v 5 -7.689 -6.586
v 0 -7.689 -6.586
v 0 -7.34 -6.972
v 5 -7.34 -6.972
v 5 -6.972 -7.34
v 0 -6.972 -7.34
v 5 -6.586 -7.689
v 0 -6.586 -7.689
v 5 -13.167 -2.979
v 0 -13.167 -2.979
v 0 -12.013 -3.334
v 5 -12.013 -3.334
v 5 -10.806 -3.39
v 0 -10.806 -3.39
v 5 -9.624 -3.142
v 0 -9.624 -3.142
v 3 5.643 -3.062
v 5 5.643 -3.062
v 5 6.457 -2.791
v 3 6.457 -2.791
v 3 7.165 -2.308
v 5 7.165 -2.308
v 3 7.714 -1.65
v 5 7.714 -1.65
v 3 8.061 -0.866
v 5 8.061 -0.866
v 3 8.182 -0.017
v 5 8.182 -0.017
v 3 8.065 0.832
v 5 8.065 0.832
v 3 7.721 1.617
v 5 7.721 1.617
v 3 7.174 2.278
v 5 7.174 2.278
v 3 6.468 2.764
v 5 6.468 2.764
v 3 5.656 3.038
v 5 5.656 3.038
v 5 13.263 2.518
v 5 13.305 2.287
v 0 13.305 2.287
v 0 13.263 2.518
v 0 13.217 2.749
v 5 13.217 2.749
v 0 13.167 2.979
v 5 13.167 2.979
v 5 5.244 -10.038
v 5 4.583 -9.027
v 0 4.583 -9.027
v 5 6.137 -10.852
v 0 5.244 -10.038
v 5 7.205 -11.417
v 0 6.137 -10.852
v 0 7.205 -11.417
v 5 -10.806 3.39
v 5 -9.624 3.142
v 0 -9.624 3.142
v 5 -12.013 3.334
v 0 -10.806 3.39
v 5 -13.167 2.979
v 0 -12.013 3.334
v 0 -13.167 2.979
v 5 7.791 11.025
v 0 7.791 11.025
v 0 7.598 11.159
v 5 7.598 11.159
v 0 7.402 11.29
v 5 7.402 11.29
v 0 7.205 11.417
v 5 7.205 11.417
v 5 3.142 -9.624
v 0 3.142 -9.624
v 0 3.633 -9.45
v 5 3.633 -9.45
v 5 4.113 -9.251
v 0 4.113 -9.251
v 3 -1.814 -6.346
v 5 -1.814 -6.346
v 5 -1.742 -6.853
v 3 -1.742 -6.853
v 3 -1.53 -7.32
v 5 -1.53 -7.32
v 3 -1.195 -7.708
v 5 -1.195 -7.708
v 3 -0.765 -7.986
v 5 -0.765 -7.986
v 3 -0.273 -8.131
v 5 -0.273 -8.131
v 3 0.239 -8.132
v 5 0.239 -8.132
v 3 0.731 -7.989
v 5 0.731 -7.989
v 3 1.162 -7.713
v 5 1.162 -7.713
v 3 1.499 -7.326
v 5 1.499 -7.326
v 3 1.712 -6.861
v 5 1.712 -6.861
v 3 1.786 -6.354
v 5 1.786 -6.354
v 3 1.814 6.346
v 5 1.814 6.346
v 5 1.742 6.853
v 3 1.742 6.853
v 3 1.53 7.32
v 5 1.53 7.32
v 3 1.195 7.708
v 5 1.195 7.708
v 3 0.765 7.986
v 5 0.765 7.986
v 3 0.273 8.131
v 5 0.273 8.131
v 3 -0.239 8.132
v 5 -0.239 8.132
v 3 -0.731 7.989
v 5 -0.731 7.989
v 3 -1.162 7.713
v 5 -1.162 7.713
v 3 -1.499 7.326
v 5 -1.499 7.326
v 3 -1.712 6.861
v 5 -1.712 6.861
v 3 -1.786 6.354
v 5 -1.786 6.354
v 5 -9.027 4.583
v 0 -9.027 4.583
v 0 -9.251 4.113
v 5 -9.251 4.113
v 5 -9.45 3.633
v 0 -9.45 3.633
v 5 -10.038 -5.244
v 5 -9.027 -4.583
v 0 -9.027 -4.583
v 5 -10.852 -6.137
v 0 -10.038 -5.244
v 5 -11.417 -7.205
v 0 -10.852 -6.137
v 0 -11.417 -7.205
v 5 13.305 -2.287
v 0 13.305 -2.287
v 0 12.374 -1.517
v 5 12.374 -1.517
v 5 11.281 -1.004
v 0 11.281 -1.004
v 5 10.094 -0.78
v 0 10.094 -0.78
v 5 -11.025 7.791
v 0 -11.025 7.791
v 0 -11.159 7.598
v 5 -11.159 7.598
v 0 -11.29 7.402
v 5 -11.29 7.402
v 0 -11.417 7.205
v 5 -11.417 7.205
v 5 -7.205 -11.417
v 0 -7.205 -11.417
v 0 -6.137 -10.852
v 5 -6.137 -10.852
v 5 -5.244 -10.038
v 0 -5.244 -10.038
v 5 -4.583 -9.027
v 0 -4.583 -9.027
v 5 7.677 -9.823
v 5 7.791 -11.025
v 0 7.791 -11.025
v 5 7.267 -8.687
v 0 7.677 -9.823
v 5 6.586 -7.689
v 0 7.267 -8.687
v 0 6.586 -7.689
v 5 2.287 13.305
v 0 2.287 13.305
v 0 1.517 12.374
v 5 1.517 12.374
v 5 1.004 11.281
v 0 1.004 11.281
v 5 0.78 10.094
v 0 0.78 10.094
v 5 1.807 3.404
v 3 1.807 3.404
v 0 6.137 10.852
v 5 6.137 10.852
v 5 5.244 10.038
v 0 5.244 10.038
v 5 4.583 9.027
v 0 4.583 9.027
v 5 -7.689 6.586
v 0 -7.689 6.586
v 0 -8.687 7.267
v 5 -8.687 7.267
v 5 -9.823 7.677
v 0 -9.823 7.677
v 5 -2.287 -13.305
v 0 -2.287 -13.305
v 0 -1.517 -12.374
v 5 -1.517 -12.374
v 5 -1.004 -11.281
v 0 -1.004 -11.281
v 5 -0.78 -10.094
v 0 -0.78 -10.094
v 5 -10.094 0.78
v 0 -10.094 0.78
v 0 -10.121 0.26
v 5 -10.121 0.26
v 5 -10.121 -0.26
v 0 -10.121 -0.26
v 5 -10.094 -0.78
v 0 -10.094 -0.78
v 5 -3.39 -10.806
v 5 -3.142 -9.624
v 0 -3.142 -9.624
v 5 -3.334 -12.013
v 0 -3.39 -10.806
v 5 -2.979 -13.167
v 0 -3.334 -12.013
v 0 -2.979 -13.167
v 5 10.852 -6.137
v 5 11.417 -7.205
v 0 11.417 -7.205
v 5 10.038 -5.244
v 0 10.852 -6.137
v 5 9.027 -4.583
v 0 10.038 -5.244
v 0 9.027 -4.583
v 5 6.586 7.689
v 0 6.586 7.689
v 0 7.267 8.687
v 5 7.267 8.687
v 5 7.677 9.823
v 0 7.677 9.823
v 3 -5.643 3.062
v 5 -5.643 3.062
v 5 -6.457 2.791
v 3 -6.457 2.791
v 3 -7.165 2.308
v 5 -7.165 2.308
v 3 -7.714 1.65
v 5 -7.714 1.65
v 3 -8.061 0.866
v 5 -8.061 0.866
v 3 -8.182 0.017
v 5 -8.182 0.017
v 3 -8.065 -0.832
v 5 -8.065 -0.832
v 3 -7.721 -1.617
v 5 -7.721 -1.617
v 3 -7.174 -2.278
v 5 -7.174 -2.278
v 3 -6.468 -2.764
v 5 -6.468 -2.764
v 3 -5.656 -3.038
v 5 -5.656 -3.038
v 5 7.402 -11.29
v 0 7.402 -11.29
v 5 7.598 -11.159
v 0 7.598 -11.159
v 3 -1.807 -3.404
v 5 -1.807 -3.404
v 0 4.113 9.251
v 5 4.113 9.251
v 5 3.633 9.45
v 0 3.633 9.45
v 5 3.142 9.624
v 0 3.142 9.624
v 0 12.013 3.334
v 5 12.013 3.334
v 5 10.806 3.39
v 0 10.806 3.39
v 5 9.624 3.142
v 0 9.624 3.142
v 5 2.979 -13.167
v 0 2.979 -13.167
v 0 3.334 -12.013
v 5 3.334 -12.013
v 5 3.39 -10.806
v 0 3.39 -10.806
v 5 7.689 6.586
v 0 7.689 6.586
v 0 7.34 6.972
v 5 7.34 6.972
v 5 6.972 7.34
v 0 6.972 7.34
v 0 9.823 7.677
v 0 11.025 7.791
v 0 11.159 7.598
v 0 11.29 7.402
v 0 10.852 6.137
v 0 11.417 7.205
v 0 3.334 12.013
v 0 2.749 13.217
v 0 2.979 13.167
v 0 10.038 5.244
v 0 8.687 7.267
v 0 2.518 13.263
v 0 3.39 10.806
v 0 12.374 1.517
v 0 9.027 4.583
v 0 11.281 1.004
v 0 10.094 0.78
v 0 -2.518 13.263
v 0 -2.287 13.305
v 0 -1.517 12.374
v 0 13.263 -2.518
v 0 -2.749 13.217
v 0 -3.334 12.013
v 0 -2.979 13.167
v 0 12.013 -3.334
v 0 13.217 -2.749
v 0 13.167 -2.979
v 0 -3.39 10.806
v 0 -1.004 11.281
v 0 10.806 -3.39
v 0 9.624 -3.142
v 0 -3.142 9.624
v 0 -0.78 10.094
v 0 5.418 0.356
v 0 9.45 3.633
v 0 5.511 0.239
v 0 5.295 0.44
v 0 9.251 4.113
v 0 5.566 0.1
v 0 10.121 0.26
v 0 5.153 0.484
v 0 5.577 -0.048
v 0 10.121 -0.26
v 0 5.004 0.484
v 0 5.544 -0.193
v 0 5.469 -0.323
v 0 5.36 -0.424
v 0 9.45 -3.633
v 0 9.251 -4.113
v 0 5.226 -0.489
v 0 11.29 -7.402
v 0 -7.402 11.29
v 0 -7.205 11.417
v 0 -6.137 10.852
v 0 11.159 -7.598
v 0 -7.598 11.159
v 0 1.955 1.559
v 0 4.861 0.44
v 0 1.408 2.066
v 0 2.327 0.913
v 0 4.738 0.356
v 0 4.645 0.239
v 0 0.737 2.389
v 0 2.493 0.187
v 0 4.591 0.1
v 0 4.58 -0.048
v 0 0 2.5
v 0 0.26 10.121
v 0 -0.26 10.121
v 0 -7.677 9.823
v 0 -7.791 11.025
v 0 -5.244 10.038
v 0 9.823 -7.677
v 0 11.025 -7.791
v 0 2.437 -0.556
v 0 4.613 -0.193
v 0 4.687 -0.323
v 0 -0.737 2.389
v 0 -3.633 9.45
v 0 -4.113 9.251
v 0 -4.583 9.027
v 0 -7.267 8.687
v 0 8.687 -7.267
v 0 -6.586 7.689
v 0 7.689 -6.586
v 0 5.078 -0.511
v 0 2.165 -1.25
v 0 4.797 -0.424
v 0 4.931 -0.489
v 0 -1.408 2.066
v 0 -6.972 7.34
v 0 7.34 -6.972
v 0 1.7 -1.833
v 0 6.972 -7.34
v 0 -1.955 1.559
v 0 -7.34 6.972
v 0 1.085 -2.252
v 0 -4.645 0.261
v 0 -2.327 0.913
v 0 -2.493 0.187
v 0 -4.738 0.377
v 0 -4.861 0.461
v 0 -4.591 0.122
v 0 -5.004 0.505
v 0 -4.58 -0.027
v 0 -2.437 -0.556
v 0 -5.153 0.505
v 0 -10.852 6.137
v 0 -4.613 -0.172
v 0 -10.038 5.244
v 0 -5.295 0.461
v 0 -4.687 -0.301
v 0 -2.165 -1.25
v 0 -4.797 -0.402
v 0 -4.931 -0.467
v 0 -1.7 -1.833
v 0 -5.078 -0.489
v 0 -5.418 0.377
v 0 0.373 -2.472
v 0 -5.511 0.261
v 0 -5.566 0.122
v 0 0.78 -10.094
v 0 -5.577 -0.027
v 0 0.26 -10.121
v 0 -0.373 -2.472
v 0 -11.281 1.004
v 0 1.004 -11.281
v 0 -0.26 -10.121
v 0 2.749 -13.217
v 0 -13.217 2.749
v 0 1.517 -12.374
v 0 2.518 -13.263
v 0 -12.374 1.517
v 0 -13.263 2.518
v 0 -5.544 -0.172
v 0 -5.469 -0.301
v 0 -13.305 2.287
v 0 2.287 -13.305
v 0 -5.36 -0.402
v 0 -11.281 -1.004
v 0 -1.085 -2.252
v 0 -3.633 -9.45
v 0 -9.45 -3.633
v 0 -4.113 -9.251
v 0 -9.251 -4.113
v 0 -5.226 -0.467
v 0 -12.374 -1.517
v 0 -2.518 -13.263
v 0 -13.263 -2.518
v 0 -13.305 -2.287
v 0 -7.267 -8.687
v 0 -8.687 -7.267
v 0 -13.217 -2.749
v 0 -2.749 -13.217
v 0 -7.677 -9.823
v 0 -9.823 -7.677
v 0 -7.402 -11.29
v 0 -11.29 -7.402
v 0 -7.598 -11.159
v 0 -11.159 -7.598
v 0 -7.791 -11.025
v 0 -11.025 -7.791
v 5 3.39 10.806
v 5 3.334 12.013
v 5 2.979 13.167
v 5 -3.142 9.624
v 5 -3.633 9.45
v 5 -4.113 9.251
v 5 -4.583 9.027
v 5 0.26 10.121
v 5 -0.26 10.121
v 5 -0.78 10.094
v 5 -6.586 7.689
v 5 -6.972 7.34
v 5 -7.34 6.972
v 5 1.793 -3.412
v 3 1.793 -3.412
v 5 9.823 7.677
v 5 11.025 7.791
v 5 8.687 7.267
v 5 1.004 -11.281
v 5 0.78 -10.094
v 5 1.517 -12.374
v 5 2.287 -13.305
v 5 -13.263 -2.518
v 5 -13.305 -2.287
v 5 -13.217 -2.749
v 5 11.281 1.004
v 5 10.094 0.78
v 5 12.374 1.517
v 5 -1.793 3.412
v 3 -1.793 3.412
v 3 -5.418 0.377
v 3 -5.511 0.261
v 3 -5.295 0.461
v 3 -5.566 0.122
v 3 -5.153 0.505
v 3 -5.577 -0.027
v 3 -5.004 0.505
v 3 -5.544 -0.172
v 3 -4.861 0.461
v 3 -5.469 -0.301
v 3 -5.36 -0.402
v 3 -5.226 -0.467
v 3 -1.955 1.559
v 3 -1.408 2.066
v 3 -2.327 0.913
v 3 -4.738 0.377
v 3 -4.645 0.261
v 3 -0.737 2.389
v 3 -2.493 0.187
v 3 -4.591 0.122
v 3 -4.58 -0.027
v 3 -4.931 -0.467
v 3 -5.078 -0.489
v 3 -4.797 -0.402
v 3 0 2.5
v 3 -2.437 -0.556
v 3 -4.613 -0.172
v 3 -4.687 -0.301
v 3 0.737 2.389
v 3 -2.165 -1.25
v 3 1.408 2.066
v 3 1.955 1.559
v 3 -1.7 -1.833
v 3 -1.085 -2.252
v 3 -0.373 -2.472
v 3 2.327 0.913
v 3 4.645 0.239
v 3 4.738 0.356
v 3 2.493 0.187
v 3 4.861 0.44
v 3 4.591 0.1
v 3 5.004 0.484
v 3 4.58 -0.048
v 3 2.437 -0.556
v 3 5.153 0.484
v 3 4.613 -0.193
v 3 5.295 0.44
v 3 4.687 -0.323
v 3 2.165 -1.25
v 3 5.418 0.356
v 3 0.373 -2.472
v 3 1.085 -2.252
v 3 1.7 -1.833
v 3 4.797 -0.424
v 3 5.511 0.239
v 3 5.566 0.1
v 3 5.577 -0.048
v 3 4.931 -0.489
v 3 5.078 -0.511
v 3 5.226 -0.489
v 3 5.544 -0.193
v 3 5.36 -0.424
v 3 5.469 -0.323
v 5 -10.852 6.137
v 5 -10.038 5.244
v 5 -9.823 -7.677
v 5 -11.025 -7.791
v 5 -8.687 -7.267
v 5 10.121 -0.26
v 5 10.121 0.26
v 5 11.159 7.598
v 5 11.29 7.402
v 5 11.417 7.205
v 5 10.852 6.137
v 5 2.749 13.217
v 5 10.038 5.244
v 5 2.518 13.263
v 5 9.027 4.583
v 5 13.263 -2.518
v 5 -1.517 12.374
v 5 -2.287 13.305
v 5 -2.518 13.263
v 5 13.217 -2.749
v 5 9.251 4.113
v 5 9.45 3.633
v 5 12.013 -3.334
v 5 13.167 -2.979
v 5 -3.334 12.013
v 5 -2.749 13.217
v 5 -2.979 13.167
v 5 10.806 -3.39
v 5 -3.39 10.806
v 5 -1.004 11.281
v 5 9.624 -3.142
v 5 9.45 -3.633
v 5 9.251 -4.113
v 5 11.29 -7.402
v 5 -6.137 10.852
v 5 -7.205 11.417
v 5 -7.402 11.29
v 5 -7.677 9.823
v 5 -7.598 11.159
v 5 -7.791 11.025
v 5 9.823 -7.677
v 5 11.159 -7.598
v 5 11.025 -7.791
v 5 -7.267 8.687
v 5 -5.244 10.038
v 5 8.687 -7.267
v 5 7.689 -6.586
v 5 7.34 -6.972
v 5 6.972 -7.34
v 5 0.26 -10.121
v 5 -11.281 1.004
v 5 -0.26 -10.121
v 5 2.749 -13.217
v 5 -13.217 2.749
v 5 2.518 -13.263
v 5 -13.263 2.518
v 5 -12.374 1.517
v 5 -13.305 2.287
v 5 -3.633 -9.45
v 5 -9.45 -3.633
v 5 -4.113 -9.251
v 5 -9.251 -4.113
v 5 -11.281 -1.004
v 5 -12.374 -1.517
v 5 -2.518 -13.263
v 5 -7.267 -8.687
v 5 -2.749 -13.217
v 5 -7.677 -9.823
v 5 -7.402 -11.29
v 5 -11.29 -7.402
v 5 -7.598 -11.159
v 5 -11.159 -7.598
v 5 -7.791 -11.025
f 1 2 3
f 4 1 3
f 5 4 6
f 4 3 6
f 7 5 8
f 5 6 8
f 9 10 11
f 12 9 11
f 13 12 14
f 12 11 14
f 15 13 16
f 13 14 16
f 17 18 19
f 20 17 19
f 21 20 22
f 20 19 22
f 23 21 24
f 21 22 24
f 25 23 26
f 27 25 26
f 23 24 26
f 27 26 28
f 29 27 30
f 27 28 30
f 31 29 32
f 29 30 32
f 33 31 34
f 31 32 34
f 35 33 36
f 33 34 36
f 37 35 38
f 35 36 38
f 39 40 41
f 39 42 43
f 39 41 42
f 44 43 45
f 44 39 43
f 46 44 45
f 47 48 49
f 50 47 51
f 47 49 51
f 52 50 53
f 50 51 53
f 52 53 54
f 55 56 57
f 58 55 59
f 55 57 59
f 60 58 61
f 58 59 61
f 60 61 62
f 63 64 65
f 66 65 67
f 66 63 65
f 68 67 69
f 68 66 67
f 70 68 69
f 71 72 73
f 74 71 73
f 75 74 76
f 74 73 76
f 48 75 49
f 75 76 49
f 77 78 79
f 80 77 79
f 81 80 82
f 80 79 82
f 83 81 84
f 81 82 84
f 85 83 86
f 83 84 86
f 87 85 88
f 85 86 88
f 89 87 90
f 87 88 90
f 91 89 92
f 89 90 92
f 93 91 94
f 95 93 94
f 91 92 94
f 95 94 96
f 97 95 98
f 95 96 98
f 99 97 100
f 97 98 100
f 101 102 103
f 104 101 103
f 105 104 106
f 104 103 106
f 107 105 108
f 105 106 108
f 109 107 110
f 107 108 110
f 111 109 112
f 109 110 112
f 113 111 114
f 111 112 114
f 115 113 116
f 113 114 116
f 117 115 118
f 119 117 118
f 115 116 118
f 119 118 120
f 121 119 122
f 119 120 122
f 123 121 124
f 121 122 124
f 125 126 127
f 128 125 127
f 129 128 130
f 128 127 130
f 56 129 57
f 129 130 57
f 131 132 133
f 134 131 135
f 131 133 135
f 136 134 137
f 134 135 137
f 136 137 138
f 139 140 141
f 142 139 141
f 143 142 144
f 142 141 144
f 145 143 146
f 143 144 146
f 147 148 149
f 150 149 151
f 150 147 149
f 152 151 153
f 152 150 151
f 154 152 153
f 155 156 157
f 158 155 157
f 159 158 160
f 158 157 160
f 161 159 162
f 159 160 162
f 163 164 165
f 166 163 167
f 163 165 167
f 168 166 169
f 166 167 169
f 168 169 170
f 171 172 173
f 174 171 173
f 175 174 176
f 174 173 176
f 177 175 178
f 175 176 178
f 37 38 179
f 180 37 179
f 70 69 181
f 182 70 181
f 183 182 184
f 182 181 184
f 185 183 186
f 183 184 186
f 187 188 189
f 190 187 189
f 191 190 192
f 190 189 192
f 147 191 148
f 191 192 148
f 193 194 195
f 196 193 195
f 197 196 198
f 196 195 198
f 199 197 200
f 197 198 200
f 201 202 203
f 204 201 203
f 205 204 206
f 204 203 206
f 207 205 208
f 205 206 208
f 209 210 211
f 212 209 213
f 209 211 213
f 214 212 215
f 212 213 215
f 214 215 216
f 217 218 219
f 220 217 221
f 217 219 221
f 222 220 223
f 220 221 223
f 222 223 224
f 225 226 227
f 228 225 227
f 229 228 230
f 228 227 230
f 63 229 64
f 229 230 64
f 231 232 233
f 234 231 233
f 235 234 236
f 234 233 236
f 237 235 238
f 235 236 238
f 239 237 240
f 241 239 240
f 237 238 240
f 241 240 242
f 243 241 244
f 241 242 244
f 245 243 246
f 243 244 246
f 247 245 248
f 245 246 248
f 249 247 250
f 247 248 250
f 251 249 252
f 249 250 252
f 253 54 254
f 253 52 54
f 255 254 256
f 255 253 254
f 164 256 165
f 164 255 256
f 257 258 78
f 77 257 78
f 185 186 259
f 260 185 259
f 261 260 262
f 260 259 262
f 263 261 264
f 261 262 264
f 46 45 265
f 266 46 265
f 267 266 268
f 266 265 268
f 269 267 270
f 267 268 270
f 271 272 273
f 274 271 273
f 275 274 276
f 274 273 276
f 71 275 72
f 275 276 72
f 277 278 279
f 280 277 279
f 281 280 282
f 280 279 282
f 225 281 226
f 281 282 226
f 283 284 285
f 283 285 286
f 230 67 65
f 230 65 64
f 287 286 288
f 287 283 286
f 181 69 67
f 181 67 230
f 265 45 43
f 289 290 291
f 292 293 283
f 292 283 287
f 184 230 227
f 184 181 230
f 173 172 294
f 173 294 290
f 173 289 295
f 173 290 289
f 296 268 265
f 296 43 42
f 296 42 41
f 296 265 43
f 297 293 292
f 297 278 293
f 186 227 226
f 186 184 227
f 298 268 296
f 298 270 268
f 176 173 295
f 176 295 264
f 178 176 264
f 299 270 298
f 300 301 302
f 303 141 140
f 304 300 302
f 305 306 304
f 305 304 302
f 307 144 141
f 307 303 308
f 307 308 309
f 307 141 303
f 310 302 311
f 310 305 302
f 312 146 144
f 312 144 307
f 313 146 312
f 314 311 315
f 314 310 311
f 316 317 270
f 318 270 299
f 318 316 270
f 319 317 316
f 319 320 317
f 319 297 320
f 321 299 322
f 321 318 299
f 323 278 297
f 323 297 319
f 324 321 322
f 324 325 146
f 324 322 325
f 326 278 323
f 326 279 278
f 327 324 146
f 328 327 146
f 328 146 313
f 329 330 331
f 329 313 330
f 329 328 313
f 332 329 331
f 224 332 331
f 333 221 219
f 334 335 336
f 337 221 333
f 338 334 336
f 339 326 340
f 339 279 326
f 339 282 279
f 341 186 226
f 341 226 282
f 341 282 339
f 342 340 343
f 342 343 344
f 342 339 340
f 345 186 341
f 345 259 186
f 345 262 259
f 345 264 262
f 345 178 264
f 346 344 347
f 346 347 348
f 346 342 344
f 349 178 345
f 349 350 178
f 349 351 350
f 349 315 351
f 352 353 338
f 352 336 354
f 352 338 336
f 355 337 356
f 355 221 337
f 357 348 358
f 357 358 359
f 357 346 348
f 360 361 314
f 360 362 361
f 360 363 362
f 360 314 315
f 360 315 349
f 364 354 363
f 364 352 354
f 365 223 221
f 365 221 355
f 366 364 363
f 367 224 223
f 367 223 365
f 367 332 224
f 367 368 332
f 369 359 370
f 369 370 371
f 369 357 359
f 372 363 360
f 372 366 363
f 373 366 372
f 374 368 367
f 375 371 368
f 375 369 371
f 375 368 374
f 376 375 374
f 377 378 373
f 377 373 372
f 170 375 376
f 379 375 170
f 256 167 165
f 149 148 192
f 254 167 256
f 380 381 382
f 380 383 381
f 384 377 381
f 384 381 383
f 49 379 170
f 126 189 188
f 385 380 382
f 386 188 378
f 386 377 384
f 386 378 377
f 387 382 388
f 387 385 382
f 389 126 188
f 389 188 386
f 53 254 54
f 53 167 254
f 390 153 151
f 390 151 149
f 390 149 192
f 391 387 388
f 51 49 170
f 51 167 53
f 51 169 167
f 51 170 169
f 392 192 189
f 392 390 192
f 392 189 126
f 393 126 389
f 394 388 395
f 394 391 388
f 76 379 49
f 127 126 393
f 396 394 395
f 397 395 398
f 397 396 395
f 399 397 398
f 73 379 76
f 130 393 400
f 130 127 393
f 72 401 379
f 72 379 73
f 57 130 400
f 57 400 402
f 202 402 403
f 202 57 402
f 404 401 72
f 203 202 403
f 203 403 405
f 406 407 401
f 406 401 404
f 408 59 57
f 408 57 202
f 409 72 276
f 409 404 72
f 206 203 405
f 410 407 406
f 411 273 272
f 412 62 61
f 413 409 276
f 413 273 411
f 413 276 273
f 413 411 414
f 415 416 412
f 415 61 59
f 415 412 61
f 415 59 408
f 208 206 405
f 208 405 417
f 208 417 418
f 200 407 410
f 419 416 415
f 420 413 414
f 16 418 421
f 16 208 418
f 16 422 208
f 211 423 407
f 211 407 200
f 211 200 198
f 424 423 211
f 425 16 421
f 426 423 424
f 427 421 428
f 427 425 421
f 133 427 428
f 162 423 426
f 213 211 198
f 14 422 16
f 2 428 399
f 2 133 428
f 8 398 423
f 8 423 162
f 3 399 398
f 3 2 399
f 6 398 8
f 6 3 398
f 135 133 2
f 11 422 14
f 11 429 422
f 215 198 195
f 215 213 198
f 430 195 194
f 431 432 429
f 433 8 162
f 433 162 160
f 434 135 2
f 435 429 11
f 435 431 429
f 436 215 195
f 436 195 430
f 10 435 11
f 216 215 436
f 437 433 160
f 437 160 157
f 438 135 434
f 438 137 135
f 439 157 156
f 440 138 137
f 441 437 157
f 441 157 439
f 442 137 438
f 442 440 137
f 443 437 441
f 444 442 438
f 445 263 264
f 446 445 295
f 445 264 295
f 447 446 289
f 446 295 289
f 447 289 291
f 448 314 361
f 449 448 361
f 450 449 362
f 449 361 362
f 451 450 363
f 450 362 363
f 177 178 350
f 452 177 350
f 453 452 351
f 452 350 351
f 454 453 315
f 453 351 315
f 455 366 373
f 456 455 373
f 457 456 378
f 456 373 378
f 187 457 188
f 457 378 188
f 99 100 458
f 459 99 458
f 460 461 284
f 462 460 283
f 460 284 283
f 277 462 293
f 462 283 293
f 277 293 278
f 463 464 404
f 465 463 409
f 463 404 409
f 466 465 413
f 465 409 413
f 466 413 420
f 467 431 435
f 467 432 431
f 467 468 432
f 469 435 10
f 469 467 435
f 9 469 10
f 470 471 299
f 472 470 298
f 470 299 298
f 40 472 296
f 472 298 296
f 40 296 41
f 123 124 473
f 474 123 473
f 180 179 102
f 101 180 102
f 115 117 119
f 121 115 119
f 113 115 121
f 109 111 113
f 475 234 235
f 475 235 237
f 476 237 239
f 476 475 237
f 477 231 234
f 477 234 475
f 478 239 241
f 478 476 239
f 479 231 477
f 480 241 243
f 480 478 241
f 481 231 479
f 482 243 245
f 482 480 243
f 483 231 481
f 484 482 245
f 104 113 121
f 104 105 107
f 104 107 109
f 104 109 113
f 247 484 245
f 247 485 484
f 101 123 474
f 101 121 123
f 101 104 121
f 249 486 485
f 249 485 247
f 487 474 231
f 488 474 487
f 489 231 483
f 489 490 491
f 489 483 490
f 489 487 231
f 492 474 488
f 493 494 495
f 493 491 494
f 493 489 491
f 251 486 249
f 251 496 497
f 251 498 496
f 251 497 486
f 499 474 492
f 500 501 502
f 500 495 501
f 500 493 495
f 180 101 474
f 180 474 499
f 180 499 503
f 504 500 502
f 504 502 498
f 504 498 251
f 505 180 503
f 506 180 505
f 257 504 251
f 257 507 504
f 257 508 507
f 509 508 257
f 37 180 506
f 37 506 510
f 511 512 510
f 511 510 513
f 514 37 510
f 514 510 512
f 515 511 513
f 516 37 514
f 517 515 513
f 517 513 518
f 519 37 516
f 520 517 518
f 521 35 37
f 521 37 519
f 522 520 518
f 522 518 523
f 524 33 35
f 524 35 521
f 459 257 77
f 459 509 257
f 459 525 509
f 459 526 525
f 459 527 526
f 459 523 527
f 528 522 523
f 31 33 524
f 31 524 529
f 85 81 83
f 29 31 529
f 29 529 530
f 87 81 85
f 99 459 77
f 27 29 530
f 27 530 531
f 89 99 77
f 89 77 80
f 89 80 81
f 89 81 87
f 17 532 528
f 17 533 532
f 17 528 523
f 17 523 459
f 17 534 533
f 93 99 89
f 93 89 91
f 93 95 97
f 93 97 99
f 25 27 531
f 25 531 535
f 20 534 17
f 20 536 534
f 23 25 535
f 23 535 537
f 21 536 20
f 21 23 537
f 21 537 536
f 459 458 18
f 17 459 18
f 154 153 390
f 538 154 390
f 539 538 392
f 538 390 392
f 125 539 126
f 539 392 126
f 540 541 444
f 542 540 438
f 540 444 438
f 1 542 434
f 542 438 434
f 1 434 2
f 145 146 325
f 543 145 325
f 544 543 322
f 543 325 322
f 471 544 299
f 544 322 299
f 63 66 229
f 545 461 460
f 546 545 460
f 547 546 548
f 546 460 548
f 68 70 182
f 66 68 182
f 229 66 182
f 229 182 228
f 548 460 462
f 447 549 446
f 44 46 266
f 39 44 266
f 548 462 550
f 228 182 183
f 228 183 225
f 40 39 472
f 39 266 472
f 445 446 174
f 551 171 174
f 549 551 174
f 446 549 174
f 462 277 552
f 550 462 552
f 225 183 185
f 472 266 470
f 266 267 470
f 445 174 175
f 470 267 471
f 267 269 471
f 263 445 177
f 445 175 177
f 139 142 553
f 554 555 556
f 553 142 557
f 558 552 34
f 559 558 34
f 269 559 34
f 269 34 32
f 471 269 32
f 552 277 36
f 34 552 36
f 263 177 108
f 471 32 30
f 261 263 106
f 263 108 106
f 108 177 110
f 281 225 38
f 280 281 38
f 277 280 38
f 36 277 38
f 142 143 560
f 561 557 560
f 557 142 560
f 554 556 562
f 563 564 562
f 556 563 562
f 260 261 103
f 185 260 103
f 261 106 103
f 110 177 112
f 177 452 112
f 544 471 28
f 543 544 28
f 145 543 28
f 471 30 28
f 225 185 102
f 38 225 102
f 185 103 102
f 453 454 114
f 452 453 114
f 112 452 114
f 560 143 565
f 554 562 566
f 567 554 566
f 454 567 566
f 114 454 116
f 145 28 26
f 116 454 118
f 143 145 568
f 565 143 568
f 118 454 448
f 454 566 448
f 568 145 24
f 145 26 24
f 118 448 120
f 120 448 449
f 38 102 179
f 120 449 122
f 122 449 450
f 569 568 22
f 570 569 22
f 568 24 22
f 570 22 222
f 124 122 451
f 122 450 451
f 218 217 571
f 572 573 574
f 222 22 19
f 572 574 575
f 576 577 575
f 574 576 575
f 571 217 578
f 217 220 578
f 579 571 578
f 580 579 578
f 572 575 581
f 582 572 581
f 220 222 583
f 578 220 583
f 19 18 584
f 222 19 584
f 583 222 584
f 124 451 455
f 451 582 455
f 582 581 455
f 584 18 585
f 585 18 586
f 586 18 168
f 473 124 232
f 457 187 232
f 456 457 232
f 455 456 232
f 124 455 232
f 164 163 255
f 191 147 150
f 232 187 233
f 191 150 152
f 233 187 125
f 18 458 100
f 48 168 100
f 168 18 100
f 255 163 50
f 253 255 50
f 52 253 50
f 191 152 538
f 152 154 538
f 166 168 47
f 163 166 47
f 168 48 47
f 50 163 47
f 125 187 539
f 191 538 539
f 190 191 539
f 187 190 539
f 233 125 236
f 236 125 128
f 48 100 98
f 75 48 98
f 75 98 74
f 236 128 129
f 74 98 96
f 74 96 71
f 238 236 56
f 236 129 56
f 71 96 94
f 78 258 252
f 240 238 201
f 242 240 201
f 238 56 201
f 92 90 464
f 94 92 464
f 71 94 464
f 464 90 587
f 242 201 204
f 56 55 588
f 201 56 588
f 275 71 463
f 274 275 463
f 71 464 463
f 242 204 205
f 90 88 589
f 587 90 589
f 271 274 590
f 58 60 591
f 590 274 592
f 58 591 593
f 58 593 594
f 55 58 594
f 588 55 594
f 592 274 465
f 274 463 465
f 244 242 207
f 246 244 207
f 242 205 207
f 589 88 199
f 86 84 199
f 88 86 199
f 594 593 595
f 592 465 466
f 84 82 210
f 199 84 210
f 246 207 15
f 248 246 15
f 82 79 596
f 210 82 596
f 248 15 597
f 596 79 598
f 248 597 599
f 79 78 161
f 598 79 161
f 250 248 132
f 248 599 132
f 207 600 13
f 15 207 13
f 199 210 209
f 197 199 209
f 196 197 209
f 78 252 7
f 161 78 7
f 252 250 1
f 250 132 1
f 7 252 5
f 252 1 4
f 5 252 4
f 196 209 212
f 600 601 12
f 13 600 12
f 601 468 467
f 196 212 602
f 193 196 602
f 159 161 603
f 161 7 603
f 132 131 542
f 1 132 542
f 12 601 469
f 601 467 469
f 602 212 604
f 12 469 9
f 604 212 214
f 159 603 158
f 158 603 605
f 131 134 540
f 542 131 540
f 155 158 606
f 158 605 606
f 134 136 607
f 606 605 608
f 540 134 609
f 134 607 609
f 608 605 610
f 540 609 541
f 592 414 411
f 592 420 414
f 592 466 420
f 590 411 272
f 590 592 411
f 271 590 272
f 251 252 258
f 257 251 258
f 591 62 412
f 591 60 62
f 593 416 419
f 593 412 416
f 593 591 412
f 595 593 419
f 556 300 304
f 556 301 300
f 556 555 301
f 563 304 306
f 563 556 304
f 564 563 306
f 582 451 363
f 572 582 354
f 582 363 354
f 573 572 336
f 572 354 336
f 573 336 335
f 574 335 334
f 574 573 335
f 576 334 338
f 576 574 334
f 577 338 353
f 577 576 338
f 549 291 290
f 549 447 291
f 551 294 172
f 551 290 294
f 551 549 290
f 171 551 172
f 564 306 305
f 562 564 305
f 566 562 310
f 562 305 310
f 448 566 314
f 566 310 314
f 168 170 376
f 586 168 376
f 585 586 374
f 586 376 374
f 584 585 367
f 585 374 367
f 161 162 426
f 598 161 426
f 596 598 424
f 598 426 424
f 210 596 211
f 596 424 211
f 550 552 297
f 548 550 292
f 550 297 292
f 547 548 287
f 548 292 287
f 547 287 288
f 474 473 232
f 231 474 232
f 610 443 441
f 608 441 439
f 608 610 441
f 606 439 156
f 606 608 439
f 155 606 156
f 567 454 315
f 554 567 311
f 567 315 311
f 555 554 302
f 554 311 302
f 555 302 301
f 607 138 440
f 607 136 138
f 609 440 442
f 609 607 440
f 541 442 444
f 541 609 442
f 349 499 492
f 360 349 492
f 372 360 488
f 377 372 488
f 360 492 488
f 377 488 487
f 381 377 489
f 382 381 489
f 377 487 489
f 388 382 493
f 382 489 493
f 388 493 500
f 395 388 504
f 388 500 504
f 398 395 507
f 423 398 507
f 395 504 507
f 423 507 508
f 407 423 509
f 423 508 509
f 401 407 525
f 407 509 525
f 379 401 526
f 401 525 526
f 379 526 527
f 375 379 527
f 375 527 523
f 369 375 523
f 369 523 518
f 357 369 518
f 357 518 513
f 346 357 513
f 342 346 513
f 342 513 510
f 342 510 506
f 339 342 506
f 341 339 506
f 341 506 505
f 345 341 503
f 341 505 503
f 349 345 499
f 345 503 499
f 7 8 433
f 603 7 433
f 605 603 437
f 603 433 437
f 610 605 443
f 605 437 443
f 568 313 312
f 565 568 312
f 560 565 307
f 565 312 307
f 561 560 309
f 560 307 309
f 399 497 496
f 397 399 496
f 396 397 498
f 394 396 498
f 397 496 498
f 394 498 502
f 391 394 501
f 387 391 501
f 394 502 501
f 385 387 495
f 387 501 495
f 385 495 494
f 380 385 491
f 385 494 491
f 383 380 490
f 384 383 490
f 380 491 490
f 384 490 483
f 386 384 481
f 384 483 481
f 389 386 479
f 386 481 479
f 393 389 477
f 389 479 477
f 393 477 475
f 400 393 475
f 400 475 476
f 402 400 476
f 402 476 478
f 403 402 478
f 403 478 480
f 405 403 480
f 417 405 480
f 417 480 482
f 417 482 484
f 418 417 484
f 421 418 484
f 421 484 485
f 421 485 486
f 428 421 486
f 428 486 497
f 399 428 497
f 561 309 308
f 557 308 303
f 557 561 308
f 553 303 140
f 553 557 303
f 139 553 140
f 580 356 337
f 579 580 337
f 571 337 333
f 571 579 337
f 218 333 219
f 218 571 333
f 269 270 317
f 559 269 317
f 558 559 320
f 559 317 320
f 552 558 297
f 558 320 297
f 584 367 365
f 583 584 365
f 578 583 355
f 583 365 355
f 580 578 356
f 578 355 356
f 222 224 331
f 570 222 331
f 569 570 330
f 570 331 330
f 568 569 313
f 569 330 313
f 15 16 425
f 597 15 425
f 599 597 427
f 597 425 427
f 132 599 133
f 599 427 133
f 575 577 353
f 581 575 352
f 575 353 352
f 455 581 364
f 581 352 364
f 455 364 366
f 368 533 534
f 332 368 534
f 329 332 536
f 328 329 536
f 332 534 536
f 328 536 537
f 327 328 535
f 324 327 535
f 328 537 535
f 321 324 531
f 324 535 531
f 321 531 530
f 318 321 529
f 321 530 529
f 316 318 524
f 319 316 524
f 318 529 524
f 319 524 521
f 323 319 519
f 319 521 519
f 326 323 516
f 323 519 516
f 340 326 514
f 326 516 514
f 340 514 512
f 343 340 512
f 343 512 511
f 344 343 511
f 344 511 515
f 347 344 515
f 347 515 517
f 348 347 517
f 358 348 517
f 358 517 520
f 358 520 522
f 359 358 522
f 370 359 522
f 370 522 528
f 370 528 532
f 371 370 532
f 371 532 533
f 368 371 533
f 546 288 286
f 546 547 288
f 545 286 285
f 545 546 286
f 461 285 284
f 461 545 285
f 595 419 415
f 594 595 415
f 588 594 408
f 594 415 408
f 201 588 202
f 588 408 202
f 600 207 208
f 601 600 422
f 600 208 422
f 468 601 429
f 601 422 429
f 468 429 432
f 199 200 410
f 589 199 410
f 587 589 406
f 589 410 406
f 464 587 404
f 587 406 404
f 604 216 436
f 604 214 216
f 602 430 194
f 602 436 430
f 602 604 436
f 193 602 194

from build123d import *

# Parameters (mm, degrees)
BASPROSKE_W             = 5
BASPROSKE_H             = 13.5
TOOTHCUT_DEPTH          = 20.735754356
TEETHCUTS_COUNT         = 16
TEETHCUTS_ANGLE         = 337.5
BORSKE_R                = 2.5
BORE_DEPTH              = 50.0000508
ENL_V_MAT_EXTRU_1_DEPTH = 2
ESQUISSE2_R             = 0.5
ENL_V_MAT_EXTRU_2_DEPTH = 20.053559185


with BuildPart() as part:
    # BasProSke → Base-Revolve (revolve)
    with BuildSketch(Plane(origin=(0, 0, 0), x_dir=(1, 0, 0), z_dir=(0, 1, 0)), mode=Mode.PRIVATE) as base_revolve_sk:
        with Locations((2.5, 6.75)):
            Rectangle(BASPROSKE_W, BASPROSKE_H)
    revolve(base_revolve_sk.sketch.rotate(Axis((-10, 0, 0), (1, 0, 0)), 180), axis=Axis((-10, 0, 0), (1, 0, 0)))

    # TooCutSke → ToothCut (cut, through all)
    with BuildSketch(Plane(origin=(0, 0, 0), x_dir=(0, 0, -1), z_dir=(1, 0, 0))):
        with BuildLine():
            ThreePointArc((0.779807897, 10.093922708), (0, 10.124), (-0.779807897, 10.093922708))
            ThreePointArc((-0.779807897, 10.093922708), (-1.232785697, 11.858156262), (-2.310463203, 13.326597651))
            ThreePointArc((-2.310463203, 13.326597651), (0, 13.5254), (2.310463203, 13.326597651))
            ThreePointArc((2.310463203, 13.326597651), (1.232785697, 11.858156262), (0.779807897, 10.093922708))
        make_face()
    toothcut = extrude(amount=TOOTHCUT_DEPTH, mode=Mode.SUBTRACT)

    # TeethCuts: ToothCut ×16 about axis
    teethcuts_axis = Axis((-10, 0, 0), (1, 0, 0))
    for i in range(1, TEETHCUTS_COUNT):
        add(toothcut.rotate(teethcuts_axis, i * TEETHCUTS_ANGLE / (TEETHCUTS_COUNT - 1)), mode=Mode.SUBTRACT)

    # BorSke → Bore (cut, symmetric)
    with BuildSketch(Plane(origin=(0, 0, 0), x_dir=(0, 0, -1), z_dir=(1, 0, 0))):
        with Locations(Location((0, 0, 0), (0, 0, 180))):
            Circle(BORSKE_R)
    extrude(amount=BORE_DEPTH, both=True, mode=Mode.SUBTRACT)

    # Esquisse1 → Enlèv. mat.-Extru.1 (cut)
    with BuildSketch(Plane(origin=(5, 0, 0), x_dir=(0, 0, -1), z_dir=(1, 0, 0))):
        with BuildLine():
            Line((-6.353817175, -1.786479026), (-3.411680983, -1.792741804))
            Line((-3.411680983, -1.792741804), (-3.062404796, -5.643188497))
            ThreePointArc((-3.062404796, -5.643188497), (-0.017415965, -8.181695296), (3.038352407, -5.656174874))
            Line((3.038352407, -5.656174874), (3.404017861, -1.80725004))
            Line((3.404017861, -1.80725004), (6.346154052, -1.813512818))
            ThreePointArc((6.346154052, -1.813512818), (8.149981536, -0.017348458), (6.353817175, 1.786479026))
            Line((6.353817175, 1.786479026), (3.411680983, 1.792741804))
            Line((3.411680983, 1.792741804), (3.062404796, 5.643188497))
            ThreePointArc((3.062404796, 5.643188497), (0.017415965, 8.181695296), (-3.038352407, 5.656174874))
            Line((-3.038352407, 5.656174874), (-3.404017861, 1.80725004))
            Line((-3.404017861, 1.80725004), (-6.346154052, 1.813512818))
            ThreePointArc((-6.346154052, 1.813512818), (-8.149981536, 0.017348458), (-6.353817175, -1.786479026))
        make_face()
    extrude(amount=-ENL_V_MAT_EXTRU_1_DEPTH, mode=Mode.SUBTRACT)

    # Esquisse2 → Enlèv. mat.-Extru.2 (cut, through all)
    with BuildSketch(Plane(origin=(3, 0, 0), x_dir=(0, 0, -1), z_dir=(1, 0, 0))):
        with Locations((-0.010809829, -5.078255711)):
            Circle(ESQUISSE2_R)
        with Locations((0.010809829, 5.078255711)):
            Circle(ESQUISSE2_R)
    extrude(amount=-ENL_V_MAT_EXTRU_2_DEPTH, mode=Mode.SUBTRACT)


solid = part.part
